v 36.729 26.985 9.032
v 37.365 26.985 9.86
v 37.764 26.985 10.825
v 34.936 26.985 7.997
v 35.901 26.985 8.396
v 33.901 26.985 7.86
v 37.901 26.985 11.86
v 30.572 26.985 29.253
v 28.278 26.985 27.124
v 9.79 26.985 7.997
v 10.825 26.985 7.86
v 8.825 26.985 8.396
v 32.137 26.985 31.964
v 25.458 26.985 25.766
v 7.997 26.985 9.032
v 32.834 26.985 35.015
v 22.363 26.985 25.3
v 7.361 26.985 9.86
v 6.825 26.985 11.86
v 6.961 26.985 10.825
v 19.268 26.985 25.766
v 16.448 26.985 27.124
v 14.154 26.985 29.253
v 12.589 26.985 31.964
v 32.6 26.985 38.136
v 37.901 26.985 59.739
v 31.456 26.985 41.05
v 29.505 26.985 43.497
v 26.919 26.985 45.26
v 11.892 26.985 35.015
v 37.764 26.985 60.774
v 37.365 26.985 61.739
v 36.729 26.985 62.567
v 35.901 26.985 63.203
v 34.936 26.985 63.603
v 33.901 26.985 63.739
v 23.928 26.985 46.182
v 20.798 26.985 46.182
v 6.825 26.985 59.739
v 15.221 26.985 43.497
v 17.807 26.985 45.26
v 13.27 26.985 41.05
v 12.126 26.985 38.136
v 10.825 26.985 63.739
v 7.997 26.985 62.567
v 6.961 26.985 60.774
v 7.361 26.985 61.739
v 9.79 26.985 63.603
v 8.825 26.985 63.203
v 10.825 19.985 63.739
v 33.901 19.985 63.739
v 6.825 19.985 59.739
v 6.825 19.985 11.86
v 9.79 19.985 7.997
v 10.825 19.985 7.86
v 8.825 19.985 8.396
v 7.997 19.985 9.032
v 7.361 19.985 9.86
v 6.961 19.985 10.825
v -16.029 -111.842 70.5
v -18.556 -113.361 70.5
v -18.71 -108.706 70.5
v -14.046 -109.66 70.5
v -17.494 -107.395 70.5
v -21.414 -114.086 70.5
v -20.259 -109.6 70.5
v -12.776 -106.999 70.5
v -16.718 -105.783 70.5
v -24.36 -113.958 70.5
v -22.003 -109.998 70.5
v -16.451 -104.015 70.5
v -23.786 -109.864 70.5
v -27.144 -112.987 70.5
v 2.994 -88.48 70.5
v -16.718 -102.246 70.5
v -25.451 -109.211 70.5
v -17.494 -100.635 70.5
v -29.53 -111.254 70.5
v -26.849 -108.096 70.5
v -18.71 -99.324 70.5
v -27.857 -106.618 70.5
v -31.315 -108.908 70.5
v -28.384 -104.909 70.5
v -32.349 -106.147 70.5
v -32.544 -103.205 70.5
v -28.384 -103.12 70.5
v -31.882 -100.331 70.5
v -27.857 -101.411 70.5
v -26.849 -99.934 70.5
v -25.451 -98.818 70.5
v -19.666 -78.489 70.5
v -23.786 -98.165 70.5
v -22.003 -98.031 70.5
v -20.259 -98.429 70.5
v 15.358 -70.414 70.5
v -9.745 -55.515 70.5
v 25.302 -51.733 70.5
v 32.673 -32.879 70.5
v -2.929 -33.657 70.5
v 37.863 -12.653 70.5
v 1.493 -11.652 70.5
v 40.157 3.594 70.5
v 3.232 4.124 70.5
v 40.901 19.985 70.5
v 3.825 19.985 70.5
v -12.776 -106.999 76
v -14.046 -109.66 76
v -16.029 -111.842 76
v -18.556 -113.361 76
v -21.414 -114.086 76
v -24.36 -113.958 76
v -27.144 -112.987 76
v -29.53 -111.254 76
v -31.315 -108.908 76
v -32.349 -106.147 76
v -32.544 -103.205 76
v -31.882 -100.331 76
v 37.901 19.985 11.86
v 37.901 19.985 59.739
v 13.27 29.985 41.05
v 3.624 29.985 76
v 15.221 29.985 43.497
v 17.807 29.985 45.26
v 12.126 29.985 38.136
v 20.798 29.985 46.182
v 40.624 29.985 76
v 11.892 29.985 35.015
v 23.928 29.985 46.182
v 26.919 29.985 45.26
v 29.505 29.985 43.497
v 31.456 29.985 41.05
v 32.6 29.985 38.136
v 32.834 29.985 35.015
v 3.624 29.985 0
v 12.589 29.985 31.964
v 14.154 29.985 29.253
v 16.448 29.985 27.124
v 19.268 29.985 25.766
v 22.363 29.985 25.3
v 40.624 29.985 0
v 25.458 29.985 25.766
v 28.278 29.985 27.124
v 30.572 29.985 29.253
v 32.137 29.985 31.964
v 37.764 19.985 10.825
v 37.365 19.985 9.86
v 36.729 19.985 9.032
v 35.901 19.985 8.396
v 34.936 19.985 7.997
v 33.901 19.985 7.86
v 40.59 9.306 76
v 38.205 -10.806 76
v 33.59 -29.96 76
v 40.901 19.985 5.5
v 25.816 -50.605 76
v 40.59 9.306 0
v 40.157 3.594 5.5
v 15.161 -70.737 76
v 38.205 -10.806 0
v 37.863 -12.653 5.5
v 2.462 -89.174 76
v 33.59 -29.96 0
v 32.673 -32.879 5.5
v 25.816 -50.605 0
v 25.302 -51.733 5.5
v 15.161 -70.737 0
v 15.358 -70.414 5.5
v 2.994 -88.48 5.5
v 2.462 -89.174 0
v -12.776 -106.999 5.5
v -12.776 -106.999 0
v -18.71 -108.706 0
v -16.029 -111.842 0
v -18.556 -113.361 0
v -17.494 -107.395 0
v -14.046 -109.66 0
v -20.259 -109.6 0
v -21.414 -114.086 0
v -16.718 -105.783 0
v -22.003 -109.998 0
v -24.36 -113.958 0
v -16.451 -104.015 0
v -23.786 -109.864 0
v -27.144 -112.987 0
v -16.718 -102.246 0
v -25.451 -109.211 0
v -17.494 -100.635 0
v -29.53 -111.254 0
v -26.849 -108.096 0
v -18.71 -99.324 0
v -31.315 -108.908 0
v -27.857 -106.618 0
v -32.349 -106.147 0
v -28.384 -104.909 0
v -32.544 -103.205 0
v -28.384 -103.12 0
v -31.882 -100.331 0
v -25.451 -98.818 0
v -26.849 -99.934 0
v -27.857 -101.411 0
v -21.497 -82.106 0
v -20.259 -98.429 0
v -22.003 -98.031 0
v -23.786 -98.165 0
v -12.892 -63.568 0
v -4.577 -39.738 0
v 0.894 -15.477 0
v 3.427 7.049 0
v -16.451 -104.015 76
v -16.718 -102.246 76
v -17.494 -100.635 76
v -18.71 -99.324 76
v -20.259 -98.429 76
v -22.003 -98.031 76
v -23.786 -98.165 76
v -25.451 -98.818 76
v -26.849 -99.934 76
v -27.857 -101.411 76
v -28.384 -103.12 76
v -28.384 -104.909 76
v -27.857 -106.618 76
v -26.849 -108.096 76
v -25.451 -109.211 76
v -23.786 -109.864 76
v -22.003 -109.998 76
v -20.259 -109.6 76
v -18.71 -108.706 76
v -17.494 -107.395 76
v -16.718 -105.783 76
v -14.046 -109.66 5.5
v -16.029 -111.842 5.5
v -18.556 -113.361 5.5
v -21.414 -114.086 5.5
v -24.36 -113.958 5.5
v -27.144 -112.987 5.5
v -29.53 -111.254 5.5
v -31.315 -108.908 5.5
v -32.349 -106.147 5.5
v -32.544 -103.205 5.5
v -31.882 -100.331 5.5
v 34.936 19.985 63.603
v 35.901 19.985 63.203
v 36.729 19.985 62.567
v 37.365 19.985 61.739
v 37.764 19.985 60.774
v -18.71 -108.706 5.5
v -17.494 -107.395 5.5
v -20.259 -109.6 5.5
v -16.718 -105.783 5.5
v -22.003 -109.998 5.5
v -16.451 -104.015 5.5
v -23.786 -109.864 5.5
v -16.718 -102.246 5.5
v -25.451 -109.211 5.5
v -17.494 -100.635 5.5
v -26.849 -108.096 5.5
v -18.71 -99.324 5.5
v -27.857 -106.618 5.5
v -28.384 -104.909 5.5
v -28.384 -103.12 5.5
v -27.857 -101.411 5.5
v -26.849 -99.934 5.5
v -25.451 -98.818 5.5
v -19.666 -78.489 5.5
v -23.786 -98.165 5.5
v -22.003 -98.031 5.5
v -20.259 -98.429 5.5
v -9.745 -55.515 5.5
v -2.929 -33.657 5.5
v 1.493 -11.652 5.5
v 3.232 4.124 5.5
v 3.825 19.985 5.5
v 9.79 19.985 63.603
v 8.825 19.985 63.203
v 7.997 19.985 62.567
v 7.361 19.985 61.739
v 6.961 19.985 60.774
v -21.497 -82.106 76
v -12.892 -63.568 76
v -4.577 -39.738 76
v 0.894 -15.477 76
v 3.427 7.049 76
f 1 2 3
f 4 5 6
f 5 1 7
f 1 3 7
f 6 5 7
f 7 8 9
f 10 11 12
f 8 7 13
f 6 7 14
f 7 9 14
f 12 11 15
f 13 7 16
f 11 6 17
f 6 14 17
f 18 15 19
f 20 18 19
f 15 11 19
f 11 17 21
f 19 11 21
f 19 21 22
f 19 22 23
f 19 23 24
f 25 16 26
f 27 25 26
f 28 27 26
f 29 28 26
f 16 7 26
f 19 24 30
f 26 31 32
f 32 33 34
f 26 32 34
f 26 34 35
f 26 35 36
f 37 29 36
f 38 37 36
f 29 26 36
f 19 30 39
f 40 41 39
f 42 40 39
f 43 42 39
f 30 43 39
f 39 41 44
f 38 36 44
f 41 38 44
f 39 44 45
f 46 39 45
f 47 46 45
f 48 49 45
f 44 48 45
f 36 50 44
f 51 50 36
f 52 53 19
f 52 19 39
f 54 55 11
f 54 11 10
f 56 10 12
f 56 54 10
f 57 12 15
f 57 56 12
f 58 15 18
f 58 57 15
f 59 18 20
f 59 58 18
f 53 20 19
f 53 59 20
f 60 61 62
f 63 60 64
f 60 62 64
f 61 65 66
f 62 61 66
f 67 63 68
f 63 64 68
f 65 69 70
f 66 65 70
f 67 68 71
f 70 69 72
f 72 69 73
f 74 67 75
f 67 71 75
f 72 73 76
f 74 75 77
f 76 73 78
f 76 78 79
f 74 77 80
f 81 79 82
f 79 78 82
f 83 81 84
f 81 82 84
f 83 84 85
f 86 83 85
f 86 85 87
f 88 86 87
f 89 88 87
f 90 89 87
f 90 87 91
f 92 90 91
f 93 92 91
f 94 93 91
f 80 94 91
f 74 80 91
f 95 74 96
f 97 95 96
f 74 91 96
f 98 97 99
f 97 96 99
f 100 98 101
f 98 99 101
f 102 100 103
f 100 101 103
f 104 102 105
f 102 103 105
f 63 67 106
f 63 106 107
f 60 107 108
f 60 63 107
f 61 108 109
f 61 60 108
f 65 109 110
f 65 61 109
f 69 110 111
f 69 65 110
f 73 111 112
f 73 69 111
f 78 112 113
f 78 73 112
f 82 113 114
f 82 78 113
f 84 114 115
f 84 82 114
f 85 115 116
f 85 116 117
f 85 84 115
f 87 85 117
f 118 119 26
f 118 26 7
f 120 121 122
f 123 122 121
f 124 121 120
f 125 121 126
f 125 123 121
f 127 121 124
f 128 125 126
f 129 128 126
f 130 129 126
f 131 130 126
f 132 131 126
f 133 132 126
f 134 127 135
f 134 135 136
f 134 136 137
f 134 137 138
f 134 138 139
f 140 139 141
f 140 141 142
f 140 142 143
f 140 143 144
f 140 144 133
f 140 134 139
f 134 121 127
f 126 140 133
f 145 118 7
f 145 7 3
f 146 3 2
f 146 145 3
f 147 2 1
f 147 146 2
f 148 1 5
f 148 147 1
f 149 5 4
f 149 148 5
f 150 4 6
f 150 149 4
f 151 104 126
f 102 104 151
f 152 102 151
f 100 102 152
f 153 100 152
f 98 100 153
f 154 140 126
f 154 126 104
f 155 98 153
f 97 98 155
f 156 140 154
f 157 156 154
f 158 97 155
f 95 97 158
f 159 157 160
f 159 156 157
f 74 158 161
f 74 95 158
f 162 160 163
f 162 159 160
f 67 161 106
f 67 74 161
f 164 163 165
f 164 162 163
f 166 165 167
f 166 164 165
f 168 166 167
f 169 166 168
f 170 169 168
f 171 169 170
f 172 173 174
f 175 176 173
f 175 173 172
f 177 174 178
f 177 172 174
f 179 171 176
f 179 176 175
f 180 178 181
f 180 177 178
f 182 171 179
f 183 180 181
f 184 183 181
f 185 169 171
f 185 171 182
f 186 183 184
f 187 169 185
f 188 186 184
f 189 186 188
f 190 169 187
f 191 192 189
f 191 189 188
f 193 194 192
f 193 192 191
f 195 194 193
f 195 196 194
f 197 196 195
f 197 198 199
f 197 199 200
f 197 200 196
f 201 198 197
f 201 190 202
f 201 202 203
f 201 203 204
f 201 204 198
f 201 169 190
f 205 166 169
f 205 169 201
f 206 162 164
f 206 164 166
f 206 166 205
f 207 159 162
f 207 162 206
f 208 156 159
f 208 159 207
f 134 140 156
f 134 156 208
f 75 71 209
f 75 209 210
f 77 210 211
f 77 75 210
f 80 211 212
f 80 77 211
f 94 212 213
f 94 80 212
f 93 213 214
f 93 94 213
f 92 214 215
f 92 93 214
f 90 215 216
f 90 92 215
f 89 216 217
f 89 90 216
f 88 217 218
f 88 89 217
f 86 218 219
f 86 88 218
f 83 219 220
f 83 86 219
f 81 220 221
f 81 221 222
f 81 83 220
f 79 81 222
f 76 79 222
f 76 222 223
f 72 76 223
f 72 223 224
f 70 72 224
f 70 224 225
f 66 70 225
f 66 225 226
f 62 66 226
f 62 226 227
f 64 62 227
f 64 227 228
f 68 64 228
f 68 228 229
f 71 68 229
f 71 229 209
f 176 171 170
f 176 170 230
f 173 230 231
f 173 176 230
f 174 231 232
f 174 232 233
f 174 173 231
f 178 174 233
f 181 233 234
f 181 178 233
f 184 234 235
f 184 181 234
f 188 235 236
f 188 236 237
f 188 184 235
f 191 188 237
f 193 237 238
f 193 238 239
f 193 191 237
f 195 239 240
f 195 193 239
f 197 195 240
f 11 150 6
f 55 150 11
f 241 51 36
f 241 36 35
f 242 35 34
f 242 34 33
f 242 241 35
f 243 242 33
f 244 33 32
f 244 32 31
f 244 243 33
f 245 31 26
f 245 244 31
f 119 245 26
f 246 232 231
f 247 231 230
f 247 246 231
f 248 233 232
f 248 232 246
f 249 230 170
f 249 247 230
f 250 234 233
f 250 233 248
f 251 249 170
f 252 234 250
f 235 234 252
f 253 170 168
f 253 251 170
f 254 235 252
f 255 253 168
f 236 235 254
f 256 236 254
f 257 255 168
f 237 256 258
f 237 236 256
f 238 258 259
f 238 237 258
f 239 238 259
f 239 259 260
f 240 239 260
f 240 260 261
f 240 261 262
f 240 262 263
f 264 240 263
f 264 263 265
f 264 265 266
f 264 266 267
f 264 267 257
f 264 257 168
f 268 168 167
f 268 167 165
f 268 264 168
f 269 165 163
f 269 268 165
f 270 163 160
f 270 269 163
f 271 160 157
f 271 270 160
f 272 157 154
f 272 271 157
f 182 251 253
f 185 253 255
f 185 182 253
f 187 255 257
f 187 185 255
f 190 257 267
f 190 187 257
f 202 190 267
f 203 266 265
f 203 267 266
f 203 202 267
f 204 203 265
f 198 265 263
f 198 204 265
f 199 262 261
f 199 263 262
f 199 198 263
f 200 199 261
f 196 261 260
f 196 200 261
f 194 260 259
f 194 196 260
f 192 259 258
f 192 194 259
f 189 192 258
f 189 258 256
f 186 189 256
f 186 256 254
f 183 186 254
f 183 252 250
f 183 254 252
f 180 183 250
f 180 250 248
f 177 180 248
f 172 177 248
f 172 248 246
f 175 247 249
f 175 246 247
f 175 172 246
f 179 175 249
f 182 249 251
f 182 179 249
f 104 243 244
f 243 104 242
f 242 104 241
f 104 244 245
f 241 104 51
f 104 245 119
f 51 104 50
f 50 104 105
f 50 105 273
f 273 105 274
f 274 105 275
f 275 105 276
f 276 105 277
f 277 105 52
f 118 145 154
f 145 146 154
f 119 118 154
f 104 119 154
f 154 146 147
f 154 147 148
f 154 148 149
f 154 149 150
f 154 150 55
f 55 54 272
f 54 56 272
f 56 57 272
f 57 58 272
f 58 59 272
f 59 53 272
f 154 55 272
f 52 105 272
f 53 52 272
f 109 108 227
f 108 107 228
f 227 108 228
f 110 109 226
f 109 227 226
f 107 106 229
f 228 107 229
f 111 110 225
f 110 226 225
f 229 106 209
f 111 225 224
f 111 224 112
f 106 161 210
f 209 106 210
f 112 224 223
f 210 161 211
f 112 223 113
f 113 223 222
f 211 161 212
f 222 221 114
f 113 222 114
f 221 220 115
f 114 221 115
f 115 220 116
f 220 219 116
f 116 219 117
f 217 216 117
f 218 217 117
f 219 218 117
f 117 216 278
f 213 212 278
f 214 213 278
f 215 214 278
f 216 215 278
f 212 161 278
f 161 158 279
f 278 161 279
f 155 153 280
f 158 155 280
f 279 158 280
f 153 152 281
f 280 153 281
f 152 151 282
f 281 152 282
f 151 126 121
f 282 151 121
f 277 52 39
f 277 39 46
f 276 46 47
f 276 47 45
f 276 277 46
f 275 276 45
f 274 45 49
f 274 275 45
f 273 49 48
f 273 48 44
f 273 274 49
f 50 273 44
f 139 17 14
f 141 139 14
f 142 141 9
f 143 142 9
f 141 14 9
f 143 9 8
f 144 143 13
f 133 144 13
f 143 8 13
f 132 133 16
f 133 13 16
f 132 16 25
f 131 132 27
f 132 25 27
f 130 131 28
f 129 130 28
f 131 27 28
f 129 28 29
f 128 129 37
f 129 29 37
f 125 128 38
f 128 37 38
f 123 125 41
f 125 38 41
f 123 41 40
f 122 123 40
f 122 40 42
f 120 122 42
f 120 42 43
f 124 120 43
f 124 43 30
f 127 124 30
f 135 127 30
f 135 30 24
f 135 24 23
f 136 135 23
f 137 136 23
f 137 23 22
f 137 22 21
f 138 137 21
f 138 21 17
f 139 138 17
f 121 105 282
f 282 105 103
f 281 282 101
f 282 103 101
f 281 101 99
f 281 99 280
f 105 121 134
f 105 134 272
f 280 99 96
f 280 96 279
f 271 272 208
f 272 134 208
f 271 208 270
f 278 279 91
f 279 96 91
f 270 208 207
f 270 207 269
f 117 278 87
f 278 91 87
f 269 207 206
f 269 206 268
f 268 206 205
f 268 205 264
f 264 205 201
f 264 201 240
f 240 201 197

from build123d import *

# Parameters (mm, degrees)
CROQUIS1_R                 = 6
SALIENTE_EXTRUIR1_DEPTH    = 76
CORTAR_EXTRUIR1_DEPTH      = 53
CORTAR_EXTRUIR1_DEPTH_BACK = 83
CROQUIS2_W                 = 65
CROQUIS2_H                 = 134.125
CORTAR_EXTRUIR4_DEPTH      = 7
CROQUIS6_R                 = 10.5
CORTAR_EXTRUIR5_DEPTH      = 7


with BuildPart() as part:
    # Croquis1 → Saliente-Extruir1 (new body)
    with BuildSketch(Plane.XY):
        with BuildLine():
            Line((3.623560213, 29.985380117), (40.623560213, 29.985380117))
            add(Edge.make_bspline(
                [(40.623560213, 29.985380117), (44.757987914, -45.934087744), (-12.775954516, -106.998983358)],
                knots=[0, 0, 0, 1, 1, 1], degree=2))
            ThreePointArc((-12.775954516, -106.998983358), (-25.787263181, -113.574217266), (-31.882365072, -100.331196951))
            add(Edge.make_bspline(
                [(3.623560213, 29.985380117), (6.510357156, -38.808737065), (-31.882365072, -100.331196951)],
                knots=[0, 0, 0, 1, 1, 1], degree=2))
        make_face()
        with Locations((-22.451139251, -104.014619883)):
            Circle(CROQUIS1_R, mode=Mode.SUBTRACT)
    extrude(amount=SALIENTE_EXTRUIR1_DEPTH)

    # Croquis2 → Cortar-Extruir1 (cut, two sides: drawn at the far end of the back side and taken through both)
    with BuildSketch(Plane(origin=(0, 0, 0), x_dir=(0, 0, -1), z_dir=(1, 0, 0)).offset(-CORTAR_EXTRUIR1_DEPTH_BACK)):
        with Locations((-38, -47.077119883)):
            Rectangle(CROQUIS2_W, CROQUIS2_H)
    extrude(amount=CORTAR_EXTRUIR1_DEPTH + CORTAR_EXTRUIR1_DEPTH_BACK, mode=Mode.SUBTRACT)

    # Croquis5 → Cortar-Extruir4 (cut)
    with BuildSketch(Plane.XZ.offset(-19.985380117)):
        with BuildLine():
            Line((10.825063576, 63.739022161), (33.900709288, 63.739022161))
            ThreePointArc((33.900709288, 63.739022161), (36.729136412, 62.567449286), (37.900709288, 59.739022161))
            Line((37.900709288, 59.739022161), (37.900709288, 11.860366898))
            ThreePointArc((37.900709288, 11.860366898), (36.729136412, 9.031939774), (33.900709288, 7.860366898))
            Line((33.900709288, 7.860366898), (10.825063576, 7.860366898))
            ThreePointArc((10.825063576, 7.860366898), (7.996636452, 9.031939774), (6.825063576, 11.860366898))
            Line((6.825063576, 11.860366898), (6.825063576, 59.739022161))
            ThreePointArc((6.825063576, 59.739022161), (7.996636452, 62.567449286), (10.825063576, 63.739022161))
        make_face()
    extrude(amount=-CORTAR_EXTRUIR4_DEPTH, mode=Mode.SUBTRACT)

    # Croquis6 → Cortar-Extruir5 (cut)
    with BuildSketch(Plane(origin=(0, 26.985380117, 0), x_dir=(-1, 0, 0), z_dir=(0, -1, 0))):
        with Locations(Location((-22.362886432, -35.79969453, 0), (0, 0, 90))):
            Circle(CROQUIS6_R)
    extrude(amount=-CORTAR_EXTRUIR5_DEPTH, mode=Mode.SUBTRACT)


solid = part.part
